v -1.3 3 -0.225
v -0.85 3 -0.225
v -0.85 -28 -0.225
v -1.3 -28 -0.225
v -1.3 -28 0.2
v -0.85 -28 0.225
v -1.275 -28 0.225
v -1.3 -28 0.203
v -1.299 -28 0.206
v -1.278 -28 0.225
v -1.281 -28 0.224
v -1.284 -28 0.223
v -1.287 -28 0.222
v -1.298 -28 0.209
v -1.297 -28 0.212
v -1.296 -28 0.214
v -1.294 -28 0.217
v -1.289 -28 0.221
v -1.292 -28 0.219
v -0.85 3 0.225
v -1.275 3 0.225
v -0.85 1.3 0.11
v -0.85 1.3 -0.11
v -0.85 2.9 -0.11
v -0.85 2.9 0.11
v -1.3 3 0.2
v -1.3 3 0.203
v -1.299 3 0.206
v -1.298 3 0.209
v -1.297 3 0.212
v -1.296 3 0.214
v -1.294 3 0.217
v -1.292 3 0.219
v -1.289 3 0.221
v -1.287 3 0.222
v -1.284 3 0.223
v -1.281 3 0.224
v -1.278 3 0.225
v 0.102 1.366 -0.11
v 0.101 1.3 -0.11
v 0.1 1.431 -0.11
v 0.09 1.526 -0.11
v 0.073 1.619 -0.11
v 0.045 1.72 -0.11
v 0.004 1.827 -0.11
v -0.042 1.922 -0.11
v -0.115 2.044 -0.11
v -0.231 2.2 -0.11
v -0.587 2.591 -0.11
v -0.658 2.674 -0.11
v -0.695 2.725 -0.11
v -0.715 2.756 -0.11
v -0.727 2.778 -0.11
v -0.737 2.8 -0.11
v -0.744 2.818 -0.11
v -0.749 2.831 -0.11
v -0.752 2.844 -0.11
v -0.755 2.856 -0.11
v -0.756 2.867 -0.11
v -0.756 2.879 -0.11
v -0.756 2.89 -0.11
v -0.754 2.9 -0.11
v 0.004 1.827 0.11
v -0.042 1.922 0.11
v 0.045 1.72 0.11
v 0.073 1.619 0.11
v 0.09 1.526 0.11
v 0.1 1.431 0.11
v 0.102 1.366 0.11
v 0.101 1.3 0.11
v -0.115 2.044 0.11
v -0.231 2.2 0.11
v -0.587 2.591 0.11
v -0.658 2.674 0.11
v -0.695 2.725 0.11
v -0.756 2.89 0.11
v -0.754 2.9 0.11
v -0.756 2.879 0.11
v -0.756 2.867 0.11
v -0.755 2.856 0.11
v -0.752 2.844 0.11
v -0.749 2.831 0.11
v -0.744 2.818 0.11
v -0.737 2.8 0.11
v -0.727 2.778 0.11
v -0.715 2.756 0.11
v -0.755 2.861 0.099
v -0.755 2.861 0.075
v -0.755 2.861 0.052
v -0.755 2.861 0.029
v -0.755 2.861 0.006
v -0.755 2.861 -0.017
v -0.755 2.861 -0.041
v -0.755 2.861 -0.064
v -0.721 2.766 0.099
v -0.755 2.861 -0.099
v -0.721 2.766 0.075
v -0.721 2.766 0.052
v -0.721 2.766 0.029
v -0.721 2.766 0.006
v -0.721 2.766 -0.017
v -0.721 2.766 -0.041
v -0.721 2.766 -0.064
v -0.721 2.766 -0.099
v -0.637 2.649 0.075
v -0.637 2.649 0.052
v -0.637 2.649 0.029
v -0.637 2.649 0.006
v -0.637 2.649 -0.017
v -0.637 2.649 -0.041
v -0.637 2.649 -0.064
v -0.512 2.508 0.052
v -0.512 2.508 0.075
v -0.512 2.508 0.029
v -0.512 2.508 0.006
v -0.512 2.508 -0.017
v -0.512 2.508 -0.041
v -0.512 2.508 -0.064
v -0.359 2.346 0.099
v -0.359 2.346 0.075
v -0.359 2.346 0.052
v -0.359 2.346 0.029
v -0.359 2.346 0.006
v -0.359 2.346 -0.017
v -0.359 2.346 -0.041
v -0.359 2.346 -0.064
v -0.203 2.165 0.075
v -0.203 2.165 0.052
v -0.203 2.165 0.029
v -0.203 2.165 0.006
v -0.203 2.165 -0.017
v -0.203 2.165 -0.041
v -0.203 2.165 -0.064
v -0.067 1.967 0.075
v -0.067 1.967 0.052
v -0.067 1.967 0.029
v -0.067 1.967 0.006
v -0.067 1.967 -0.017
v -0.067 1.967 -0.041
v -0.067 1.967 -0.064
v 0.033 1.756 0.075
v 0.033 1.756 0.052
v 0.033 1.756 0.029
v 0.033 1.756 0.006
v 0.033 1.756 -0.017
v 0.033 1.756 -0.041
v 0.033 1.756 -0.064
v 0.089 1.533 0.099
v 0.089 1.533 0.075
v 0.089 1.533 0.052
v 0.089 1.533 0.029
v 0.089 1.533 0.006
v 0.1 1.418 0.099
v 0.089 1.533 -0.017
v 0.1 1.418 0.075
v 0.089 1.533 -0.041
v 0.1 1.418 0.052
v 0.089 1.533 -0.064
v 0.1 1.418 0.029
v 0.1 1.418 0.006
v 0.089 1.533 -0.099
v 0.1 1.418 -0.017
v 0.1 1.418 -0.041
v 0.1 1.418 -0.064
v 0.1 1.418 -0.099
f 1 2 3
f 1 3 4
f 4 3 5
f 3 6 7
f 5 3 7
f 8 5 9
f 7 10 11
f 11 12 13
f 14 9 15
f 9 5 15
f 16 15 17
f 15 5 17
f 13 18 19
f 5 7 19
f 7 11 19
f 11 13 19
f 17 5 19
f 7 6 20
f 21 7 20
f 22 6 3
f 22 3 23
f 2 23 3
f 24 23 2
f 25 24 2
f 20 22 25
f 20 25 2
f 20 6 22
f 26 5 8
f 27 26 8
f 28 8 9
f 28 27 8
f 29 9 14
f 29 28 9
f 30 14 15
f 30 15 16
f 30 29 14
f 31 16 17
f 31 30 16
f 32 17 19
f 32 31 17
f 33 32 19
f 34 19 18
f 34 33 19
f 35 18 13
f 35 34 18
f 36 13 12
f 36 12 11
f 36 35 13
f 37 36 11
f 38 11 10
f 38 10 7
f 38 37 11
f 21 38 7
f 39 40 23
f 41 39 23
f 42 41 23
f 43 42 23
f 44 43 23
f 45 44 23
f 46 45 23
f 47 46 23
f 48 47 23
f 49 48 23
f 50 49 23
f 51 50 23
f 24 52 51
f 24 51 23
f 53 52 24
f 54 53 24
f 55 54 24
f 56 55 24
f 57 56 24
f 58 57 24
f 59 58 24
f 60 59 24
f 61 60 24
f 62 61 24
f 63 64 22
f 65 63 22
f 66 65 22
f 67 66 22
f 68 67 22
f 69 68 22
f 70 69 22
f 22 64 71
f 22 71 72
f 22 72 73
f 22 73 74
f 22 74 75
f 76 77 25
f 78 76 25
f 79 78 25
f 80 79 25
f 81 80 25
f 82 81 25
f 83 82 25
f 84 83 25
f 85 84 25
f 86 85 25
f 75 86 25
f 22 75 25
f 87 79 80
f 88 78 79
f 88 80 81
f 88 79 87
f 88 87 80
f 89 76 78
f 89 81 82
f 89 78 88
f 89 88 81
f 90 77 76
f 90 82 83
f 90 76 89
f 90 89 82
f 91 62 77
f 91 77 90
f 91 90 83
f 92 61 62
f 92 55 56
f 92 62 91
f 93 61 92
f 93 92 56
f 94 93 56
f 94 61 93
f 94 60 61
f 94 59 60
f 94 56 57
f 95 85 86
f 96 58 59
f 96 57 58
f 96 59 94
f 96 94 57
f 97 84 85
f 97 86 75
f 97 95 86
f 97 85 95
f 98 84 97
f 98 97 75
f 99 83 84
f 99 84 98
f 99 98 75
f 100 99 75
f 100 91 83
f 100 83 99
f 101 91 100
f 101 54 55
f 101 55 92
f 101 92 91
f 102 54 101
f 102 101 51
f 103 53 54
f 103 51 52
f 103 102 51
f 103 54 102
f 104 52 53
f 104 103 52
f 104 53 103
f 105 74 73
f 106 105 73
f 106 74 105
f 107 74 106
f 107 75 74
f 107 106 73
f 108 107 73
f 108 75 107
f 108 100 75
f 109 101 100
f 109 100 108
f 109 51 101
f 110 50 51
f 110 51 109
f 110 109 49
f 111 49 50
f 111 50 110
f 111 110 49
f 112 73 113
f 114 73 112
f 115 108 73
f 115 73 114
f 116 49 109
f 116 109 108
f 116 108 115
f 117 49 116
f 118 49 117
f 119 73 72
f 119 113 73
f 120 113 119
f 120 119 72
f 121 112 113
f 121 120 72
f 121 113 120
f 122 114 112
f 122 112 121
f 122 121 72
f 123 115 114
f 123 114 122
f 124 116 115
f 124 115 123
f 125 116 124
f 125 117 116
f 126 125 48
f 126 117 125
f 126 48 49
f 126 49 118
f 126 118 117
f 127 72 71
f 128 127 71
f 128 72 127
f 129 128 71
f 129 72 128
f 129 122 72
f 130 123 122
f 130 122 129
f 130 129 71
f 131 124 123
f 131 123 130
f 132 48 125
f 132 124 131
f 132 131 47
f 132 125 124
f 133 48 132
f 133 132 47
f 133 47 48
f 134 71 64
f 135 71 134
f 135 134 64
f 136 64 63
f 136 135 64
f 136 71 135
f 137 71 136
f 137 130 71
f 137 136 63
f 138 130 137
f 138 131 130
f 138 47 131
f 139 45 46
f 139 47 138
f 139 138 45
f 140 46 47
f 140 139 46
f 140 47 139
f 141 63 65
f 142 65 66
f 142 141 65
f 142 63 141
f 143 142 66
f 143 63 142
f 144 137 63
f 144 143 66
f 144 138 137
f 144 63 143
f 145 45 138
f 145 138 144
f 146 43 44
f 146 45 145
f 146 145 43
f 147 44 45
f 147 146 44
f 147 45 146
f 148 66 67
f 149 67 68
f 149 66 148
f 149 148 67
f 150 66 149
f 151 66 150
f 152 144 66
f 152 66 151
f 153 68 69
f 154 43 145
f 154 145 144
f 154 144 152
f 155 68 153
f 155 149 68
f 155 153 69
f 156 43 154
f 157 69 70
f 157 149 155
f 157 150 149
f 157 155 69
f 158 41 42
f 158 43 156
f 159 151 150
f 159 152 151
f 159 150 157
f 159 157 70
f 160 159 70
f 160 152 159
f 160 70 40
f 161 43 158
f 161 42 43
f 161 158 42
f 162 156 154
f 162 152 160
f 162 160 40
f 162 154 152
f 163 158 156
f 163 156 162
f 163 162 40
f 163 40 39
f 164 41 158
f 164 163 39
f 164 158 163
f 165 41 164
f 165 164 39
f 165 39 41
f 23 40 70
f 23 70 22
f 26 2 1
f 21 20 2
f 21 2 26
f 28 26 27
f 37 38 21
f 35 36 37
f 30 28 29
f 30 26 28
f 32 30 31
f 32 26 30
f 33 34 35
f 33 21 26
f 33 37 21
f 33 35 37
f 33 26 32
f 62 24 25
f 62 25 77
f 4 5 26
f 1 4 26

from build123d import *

# Parameters (mm, degrees)
BOSS_EXTRUDE1_DEPTH = 0.220347005
SKETCH2_W           = 0.335173503
SKETCH2_H           = 31
BOSS_EXTRUDE2_DEPTH = 0.45
SKETCH3_W           = 0.45
SKETCH3_H           = 31
BOSS_EXTRUDE3_DEPTH = 0.114826497
FILLET1_R           = 0.025


with BuildPart() as part:
    # Sketch1 → Boss-Extrude1 (new body)
    with BuildSketch(Plane(origin=(0, 0, -0.110173503), x_dir=(-1, 0, 0), z_dir=(0, 0, -1))):
        with BuildLine():
            Line((-0.100899126, 1.3), (0.85, 1.3))
            Line((0.85, 1.3), (0.85, 2.9))
            Line((0.85, 2.9), (0.754271379, 2.9))
            add(Edge.make_bspline(
                [(0.754271379, 2.9), (0.756059912, 2.890829896), (0.757688053, 2.871605997), (0.754283259, 2.84011903), (0.73796652, 2.792795969), (0.697785469, 2.724539071), (0.638294458, 2.646987167), (0.561118331, 2.56007299), (0.469917194, 2.464054427), (0.370218593, 2.359510578), (0.26840655, 2.24717531), (0.17098544, 2.127849346), (0.083811745, 2.002312001), (0.011182268, 1.871255904), (-0.044647472, 1.735241835), (-0.08270041, 1.594693954), (-0.098810181, 1.47885747), (-0.102928932, 1.390139391), (-0.102161317, 1.330181827), (-0.100899126, 1.3)],
                knots=[0, 0, 0, 0, 0, 0, 0.066666667, 0.133333333, 0.2, 0.266666667, 0.333333333, 0.4, 0.466666667, 0.533333333, 0.6, 0.666666667, 0.733333333, 0.8, 0.866666667, 0.933333333, 1, 1, 1, 1, 1, 1], degree=5))
        make_face()
    extrude(amount=-BOSS_EXTRUDE1_DEPTH)

    # Sketch2 → Boss-Extrude2 (add)
    with BuildSketch(Plane(origin=(-0.85, 0, 0), x_dir=(0, 0, -1), z_dir=(1, 0, 0))):
        with Locations((-0.057413248, -12.5)):
            Rectangle(SKETCH2_W, SKETCH2_H)
    extrude(amount=-BOSS_EXTRUDE2_DEPTH)

    # Sketch3 → Boss-Extrude3 (add)
    with BuildSketch(Plane(origin=(0, 0, -0.110173503), x_dir=(-1, 0, 0), z_dir=(0, 0, -1))):
        with Locations((1.075, -12.5)):
            Rectangle(SKETCH3_W, SKETCH3_H)
    extrude(amount=BOSS_EXTRUDE3_DEPTH)

    # Fillet1
    fillet1_edges = [part.edges().sort_by_distance(p)[0] for p in [
        (-1.3, -12.5, 0.225),
    ]]
    fillet(fillet1_edges, radius=FILLET1_R)


solid = part.part
